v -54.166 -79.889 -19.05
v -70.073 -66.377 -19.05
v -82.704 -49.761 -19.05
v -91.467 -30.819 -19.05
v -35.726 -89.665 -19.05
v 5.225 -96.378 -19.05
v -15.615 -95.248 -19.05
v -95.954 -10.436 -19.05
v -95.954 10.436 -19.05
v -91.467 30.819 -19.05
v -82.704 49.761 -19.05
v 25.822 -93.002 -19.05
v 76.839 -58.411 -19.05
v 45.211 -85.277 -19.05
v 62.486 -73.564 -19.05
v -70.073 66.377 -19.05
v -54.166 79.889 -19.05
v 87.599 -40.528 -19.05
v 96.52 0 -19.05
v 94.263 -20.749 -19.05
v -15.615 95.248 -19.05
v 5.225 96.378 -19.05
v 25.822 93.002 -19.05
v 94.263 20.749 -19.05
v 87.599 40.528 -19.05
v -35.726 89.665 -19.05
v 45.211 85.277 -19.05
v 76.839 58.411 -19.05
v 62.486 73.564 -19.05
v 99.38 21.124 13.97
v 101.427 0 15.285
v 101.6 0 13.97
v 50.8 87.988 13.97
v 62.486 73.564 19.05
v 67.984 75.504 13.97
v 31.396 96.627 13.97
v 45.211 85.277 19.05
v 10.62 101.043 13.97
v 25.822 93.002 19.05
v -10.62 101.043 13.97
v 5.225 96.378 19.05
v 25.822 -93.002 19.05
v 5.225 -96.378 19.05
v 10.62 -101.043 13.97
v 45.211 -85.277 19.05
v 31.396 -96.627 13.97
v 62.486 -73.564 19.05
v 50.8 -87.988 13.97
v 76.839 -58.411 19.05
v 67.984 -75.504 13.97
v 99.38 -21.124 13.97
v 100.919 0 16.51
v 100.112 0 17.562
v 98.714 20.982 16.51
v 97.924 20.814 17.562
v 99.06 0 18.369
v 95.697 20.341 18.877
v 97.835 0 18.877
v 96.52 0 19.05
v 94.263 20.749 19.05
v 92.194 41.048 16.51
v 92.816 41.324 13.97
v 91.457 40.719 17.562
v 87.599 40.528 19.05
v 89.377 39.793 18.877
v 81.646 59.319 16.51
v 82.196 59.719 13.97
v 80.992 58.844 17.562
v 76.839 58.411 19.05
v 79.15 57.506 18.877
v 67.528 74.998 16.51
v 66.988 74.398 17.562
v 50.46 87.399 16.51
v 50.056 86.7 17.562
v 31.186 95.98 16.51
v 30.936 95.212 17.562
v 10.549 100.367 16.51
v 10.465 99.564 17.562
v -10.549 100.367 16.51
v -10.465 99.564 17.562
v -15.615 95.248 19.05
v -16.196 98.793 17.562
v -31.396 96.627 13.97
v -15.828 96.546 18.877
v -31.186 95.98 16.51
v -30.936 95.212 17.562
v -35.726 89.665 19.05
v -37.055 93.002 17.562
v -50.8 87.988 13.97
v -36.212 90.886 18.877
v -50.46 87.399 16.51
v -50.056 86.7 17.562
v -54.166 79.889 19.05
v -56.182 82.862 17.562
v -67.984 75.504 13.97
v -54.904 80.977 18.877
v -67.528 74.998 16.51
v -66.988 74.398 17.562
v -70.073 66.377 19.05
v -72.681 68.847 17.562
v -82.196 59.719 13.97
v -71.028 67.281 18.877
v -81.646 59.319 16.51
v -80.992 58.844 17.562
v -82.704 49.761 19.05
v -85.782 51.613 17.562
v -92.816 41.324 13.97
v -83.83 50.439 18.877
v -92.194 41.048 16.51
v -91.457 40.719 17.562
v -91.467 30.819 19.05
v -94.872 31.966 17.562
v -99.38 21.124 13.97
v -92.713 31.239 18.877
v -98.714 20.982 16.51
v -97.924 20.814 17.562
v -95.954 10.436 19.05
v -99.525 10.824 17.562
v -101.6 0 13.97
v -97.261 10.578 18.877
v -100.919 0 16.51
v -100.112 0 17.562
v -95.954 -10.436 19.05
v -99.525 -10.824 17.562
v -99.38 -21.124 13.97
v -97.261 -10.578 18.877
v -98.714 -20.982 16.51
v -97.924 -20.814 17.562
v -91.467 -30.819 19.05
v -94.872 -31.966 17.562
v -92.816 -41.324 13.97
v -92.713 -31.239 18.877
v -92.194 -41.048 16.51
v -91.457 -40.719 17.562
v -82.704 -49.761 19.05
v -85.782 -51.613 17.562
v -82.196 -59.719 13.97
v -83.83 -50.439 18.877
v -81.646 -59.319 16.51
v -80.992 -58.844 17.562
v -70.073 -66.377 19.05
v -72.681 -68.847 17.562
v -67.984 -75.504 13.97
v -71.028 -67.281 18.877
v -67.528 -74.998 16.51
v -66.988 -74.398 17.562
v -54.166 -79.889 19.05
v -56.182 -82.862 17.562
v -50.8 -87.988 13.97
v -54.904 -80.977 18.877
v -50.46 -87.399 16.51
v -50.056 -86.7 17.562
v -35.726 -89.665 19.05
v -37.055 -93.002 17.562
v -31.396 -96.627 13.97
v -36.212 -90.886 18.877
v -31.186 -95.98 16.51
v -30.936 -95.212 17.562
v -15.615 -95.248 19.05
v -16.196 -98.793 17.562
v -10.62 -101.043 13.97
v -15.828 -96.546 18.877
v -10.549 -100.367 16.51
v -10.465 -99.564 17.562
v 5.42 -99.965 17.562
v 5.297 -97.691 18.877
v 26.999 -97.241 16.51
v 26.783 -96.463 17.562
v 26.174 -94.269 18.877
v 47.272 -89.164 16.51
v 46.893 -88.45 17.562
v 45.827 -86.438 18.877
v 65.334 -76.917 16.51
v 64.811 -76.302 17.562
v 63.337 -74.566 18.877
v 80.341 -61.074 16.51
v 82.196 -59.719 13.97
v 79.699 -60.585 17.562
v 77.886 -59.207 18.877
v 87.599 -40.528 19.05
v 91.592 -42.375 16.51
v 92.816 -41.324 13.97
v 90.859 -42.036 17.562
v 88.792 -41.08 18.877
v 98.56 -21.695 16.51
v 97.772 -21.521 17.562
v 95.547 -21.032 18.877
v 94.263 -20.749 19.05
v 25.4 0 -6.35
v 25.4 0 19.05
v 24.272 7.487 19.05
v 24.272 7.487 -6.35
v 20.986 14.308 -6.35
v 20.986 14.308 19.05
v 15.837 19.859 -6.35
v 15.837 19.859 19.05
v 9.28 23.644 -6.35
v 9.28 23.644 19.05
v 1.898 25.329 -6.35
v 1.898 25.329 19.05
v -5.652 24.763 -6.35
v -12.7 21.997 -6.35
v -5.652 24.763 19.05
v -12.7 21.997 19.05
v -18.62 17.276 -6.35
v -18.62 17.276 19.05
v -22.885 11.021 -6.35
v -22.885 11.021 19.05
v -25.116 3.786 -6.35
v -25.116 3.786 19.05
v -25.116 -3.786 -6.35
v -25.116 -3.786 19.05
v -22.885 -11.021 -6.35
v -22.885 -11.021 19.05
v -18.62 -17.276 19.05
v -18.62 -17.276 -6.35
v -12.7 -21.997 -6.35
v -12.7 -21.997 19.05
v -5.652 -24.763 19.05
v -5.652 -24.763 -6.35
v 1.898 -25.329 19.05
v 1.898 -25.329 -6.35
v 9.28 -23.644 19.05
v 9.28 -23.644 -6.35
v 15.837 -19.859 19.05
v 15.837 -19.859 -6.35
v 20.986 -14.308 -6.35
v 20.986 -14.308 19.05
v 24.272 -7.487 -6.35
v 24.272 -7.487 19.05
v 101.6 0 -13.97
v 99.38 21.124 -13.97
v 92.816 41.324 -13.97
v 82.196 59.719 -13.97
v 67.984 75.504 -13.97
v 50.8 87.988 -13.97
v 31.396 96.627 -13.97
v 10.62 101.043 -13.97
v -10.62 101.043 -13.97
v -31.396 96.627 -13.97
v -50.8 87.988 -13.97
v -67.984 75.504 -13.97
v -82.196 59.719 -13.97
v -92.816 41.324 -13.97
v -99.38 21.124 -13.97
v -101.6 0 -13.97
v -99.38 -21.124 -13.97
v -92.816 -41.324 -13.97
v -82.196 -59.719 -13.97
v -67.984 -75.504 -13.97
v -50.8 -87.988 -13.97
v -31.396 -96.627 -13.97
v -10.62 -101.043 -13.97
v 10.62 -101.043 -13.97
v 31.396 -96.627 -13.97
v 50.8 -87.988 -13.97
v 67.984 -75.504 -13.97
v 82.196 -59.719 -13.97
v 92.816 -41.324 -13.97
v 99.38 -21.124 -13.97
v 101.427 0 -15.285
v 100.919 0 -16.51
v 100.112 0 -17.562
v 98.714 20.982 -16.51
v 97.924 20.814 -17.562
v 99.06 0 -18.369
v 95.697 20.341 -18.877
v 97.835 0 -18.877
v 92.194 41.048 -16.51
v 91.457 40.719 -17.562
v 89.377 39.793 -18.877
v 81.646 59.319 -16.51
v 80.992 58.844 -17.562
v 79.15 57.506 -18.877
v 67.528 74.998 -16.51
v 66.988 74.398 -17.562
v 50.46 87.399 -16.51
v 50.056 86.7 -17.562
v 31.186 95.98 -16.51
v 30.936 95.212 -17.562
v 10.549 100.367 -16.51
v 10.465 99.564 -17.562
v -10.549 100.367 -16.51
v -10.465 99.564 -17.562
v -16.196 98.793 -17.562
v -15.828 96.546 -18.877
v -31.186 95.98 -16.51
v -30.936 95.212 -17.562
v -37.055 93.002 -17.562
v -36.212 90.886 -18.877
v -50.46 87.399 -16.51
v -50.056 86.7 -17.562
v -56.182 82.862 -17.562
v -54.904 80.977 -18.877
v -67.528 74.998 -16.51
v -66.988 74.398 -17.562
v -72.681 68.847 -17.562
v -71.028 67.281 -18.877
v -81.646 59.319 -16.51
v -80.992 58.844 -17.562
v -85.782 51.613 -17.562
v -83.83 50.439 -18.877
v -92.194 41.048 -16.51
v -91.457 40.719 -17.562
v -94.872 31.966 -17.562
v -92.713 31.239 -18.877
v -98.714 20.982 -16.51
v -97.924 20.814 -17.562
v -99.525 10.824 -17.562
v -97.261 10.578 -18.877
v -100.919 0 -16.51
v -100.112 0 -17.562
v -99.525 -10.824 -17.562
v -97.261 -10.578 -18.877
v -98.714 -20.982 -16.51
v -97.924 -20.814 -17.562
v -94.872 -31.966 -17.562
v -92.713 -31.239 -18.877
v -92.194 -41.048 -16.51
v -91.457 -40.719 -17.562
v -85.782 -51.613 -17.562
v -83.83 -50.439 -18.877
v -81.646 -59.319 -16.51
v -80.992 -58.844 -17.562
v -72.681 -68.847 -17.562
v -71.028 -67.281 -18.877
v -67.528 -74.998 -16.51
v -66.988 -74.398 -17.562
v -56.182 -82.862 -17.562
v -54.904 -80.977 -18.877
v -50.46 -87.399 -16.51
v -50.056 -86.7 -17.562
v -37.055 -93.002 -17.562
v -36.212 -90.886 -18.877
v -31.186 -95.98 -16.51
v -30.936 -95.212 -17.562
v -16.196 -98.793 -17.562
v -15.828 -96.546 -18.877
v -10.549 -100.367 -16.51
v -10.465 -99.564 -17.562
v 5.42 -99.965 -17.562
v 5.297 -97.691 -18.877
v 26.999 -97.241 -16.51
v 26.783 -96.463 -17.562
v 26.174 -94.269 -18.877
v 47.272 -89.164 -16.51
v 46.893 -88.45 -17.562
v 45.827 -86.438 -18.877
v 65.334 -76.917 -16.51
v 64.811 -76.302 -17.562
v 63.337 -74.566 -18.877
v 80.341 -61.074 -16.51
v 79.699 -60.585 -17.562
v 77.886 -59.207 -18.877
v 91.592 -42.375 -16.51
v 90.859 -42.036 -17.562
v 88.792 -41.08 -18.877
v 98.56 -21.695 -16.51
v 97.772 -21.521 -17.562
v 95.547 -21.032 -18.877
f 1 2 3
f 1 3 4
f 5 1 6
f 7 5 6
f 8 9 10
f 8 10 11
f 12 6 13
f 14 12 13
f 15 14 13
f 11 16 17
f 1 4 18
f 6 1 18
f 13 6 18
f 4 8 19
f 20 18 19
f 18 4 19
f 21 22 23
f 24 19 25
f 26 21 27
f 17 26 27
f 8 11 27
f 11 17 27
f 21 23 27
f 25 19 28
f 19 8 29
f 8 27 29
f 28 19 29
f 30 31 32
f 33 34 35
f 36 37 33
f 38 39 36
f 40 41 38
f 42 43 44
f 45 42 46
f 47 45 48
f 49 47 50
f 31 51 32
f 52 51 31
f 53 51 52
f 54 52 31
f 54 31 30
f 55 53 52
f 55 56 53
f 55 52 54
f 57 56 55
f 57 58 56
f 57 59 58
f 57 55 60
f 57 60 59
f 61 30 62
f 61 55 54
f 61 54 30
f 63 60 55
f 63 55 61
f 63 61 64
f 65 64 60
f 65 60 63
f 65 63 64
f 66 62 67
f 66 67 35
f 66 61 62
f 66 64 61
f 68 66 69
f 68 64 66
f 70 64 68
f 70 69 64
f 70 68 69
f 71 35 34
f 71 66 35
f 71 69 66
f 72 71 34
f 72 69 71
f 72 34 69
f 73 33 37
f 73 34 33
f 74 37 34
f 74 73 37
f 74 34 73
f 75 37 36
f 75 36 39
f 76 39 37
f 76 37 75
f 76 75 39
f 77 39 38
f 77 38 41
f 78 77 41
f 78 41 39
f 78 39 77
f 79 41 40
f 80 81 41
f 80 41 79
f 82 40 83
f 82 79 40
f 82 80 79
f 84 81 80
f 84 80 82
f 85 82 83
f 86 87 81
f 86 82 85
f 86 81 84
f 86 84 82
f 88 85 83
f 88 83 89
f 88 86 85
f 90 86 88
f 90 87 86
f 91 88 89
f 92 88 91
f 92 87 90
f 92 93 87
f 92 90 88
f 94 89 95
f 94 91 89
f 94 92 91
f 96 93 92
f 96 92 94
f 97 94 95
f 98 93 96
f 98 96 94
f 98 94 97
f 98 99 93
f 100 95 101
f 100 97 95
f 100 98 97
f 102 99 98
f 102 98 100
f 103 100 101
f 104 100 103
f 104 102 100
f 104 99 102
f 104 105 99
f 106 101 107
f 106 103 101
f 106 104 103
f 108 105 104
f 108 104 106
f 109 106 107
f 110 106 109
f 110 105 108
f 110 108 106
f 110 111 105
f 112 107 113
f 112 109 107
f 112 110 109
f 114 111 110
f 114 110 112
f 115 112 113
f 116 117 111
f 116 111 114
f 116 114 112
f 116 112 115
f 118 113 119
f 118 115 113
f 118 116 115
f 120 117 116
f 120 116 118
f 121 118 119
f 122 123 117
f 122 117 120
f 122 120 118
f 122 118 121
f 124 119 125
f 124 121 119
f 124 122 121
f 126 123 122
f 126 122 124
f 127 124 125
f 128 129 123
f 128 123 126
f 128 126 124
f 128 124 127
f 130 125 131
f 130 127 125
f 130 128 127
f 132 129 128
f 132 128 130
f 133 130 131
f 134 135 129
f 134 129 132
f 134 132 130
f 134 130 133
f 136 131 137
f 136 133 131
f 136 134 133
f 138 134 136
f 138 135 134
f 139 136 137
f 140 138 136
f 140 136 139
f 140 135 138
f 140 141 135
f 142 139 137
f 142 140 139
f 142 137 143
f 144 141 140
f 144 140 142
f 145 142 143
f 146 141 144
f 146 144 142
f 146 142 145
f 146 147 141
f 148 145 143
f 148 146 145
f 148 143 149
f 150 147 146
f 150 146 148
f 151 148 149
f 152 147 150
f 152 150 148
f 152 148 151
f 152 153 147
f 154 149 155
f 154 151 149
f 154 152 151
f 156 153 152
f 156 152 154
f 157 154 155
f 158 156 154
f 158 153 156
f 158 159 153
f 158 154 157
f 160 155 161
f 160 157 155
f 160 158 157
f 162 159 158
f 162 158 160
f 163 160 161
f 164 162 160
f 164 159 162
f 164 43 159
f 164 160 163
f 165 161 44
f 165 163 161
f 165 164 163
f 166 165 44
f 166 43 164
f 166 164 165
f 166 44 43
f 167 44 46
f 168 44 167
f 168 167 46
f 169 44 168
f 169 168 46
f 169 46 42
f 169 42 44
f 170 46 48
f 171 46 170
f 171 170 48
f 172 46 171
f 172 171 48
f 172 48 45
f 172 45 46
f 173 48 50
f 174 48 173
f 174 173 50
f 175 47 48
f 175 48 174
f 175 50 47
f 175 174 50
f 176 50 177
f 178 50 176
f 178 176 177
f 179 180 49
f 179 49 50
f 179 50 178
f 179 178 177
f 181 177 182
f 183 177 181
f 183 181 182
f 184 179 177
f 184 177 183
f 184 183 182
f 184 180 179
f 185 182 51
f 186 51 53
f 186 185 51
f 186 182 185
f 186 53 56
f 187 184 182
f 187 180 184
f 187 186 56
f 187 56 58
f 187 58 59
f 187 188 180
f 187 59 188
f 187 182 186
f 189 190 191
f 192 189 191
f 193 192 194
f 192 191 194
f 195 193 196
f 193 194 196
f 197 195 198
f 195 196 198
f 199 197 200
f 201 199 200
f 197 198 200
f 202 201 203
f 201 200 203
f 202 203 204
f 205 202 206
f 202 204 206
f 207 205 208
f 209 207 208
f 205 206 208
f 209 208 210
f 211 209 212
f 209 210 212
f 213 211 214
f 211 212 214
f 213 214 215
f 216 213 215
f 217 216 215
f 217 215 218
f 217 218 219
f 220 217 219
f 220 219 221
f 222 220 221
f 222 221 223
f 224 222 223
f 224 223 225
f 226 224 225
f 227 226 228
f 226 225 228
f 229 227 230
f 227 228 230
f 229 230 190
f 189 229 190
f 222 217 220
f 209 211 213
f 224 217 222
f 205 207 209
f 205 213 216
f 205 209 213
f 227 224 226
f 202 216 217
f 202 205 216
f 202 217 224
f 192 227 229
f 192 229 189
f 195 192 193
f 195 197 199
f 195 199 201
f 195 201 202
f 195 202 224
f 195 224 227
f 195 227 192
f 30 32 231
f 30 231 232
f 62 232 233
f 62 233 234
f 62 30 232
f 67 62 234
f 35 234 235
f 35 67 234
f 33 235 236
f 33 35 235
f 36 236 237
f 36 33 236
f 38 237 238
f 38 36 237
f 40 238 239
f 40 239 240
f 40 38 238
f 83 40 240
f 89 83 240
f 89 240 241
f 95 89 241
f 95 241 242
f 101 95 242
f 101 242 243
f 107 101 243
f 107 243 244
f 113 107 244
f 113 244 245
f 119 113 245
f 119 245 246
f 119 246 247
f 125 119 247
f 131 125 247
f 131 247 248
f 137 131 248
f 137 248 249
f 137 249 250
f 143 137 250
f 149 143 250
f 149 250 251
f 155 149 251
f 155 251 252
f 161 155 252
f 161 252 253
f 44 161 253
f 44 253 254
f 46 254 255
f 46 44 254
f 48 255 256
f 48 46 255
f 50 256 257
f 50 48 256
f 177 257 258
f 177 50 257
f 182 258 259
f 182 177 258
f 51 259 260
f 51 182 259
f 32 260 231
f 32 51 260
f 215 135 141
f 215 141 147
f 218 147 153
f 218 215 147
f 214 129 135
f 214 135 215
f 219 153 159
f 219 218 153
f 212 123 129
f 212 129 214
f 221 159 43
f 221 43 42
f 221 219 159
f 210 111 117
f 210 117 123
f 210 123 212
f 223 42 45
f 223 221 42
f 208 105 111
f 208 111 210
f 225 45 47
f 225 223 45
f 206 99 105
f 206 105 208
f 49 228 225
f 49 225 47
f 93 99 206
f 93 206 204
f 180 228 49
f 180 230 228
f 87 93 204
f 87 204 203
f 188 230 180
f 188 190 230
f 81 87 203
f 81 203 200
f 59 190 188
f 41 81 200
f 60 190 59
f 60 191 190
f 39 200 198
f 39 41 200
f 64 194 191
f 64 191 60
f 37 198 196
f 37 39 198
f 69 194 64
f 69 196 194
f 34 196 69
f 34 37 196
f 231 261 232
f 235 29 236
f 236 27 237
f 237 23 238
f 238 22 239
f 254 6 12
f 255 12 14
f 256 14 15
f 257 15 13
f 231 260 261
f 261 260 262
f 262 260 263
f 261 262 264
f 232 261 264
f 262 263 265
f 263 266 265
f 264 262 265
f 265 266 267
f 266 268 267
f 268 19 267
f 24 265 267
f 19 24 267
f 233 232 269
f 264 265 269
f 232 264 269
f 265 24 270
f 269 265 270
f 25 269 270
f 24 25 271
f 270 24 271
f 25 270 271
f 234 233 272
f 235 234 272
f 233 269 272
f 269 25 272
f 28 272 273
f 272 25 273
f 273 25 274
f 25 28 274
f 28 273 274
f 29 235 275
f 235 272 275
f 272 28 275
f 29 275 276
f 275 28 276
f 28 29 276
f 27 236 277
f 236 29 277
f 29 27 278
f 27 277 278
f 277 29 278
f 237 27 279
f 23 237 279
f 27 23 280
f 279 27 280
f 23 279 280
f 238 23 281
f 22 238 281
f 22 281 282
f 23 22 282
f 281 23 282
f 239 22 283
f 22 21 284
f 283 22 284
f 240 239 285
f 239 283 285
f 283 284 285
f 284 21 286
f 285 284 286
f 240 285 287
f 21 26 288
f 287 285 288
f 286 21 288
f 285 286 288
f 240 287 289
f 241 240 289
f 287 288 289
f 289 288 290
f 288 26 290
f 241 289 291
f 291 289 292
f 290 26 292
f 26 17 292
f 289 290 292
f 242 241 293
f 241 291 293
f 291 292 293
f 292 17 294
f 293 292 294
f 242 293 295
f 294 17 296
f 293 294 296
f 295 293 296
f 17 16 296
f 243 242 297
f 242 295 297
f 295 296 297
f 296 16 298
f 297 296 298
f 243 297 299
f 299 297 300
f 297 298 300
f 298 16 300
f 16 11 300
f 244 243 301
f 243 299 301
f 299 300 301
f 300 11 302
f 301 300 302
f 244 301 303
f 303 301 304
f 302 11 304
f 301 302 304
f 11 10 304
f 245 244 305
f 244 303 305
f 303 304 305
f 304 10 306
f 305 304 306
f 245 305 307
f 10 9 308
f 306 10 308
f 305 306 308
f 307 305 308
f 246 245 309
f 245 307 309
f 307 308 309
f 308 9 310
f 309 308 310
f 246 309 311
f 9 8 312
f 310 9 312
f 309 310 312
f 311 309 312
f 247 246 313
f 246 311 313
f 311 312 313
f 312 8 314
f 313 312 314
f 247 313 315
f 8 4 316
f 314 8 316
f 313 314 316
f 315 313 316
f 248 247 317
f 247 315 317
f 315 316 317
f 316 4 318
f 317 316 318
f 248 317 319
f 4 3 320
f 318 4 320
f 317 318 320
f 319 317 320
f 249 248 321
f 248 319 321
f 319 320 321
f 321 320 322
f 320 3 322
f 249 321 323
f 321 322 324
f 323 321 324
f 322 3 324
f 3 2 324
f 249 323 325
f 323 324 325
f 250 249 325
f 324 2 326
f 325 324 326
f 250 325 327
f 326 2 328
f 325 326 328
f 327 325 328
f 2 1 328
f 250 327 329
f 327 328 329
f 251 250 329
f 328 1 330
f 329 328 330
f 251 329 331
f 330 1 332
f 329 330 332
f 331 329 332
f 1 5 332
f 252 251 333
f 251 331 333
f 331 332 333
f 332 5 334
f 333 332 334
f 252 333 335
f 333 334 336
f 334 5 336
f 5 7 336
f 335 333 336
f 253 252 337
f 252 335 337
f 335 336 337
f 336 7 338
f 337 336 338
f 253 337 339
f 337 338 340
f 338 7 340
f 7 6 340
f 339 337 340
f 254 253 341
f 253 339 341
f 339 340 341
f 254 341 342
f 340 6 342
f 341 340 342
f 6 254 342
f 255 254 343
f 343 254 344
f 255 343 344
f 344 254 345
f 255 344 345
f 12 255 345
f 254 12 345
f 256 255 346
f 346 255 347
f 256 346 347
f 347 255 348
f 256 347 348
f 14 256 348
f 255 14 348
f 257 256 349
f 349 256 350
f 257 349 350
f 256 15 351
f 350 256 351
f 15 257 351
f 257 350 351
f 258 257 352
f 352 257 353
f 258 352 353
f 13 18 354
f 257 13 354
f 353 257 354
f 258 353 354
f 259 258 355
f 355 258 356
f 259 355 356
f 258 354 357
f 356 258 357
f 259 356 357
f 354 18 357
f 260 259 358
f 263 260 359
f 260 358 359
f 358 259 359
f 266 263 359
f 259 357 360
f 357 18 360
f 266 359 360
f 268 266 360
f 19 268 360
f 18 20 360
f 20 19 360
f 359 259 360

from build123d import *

# Parameters (mm, degrees)
SKETCH1_R          = 101.6
WHEEL_DEPTH        = 19.05
FILLET1_R          = 5.08
SKETCH2_R          = 25.4
CUT_EXTRUDE1_DEPTH = 25.4


with BuildPart() as part:
    # Sketch1 → Wheel (new body, symmetric)
    with BuildSketch(Plane.XY):
        Circle(SKETCH1_R)
    extrude(amount=WHEEL_DEPTH, both=True)

    # Fillet1
    fillet1_edges = [part.edges().sort_by_distance(p)[0] for p in [
        (-101.6, 0, -19.05),
        (-101.6, 0, 19.05),
    ]]
    fillet(fillet1_edges, radius=FILLET1_R)

    # Sketch2 → Cut-Extrude1 (cut)
    with BuildSketch(Plane.XY.offset(19.05)):
        Circle(SKETCH2_R)
    extrude(amount=-CUT_EXTRUDE1_DEPTH, mode=Mode.SUBTRACT)


solid = part.part
